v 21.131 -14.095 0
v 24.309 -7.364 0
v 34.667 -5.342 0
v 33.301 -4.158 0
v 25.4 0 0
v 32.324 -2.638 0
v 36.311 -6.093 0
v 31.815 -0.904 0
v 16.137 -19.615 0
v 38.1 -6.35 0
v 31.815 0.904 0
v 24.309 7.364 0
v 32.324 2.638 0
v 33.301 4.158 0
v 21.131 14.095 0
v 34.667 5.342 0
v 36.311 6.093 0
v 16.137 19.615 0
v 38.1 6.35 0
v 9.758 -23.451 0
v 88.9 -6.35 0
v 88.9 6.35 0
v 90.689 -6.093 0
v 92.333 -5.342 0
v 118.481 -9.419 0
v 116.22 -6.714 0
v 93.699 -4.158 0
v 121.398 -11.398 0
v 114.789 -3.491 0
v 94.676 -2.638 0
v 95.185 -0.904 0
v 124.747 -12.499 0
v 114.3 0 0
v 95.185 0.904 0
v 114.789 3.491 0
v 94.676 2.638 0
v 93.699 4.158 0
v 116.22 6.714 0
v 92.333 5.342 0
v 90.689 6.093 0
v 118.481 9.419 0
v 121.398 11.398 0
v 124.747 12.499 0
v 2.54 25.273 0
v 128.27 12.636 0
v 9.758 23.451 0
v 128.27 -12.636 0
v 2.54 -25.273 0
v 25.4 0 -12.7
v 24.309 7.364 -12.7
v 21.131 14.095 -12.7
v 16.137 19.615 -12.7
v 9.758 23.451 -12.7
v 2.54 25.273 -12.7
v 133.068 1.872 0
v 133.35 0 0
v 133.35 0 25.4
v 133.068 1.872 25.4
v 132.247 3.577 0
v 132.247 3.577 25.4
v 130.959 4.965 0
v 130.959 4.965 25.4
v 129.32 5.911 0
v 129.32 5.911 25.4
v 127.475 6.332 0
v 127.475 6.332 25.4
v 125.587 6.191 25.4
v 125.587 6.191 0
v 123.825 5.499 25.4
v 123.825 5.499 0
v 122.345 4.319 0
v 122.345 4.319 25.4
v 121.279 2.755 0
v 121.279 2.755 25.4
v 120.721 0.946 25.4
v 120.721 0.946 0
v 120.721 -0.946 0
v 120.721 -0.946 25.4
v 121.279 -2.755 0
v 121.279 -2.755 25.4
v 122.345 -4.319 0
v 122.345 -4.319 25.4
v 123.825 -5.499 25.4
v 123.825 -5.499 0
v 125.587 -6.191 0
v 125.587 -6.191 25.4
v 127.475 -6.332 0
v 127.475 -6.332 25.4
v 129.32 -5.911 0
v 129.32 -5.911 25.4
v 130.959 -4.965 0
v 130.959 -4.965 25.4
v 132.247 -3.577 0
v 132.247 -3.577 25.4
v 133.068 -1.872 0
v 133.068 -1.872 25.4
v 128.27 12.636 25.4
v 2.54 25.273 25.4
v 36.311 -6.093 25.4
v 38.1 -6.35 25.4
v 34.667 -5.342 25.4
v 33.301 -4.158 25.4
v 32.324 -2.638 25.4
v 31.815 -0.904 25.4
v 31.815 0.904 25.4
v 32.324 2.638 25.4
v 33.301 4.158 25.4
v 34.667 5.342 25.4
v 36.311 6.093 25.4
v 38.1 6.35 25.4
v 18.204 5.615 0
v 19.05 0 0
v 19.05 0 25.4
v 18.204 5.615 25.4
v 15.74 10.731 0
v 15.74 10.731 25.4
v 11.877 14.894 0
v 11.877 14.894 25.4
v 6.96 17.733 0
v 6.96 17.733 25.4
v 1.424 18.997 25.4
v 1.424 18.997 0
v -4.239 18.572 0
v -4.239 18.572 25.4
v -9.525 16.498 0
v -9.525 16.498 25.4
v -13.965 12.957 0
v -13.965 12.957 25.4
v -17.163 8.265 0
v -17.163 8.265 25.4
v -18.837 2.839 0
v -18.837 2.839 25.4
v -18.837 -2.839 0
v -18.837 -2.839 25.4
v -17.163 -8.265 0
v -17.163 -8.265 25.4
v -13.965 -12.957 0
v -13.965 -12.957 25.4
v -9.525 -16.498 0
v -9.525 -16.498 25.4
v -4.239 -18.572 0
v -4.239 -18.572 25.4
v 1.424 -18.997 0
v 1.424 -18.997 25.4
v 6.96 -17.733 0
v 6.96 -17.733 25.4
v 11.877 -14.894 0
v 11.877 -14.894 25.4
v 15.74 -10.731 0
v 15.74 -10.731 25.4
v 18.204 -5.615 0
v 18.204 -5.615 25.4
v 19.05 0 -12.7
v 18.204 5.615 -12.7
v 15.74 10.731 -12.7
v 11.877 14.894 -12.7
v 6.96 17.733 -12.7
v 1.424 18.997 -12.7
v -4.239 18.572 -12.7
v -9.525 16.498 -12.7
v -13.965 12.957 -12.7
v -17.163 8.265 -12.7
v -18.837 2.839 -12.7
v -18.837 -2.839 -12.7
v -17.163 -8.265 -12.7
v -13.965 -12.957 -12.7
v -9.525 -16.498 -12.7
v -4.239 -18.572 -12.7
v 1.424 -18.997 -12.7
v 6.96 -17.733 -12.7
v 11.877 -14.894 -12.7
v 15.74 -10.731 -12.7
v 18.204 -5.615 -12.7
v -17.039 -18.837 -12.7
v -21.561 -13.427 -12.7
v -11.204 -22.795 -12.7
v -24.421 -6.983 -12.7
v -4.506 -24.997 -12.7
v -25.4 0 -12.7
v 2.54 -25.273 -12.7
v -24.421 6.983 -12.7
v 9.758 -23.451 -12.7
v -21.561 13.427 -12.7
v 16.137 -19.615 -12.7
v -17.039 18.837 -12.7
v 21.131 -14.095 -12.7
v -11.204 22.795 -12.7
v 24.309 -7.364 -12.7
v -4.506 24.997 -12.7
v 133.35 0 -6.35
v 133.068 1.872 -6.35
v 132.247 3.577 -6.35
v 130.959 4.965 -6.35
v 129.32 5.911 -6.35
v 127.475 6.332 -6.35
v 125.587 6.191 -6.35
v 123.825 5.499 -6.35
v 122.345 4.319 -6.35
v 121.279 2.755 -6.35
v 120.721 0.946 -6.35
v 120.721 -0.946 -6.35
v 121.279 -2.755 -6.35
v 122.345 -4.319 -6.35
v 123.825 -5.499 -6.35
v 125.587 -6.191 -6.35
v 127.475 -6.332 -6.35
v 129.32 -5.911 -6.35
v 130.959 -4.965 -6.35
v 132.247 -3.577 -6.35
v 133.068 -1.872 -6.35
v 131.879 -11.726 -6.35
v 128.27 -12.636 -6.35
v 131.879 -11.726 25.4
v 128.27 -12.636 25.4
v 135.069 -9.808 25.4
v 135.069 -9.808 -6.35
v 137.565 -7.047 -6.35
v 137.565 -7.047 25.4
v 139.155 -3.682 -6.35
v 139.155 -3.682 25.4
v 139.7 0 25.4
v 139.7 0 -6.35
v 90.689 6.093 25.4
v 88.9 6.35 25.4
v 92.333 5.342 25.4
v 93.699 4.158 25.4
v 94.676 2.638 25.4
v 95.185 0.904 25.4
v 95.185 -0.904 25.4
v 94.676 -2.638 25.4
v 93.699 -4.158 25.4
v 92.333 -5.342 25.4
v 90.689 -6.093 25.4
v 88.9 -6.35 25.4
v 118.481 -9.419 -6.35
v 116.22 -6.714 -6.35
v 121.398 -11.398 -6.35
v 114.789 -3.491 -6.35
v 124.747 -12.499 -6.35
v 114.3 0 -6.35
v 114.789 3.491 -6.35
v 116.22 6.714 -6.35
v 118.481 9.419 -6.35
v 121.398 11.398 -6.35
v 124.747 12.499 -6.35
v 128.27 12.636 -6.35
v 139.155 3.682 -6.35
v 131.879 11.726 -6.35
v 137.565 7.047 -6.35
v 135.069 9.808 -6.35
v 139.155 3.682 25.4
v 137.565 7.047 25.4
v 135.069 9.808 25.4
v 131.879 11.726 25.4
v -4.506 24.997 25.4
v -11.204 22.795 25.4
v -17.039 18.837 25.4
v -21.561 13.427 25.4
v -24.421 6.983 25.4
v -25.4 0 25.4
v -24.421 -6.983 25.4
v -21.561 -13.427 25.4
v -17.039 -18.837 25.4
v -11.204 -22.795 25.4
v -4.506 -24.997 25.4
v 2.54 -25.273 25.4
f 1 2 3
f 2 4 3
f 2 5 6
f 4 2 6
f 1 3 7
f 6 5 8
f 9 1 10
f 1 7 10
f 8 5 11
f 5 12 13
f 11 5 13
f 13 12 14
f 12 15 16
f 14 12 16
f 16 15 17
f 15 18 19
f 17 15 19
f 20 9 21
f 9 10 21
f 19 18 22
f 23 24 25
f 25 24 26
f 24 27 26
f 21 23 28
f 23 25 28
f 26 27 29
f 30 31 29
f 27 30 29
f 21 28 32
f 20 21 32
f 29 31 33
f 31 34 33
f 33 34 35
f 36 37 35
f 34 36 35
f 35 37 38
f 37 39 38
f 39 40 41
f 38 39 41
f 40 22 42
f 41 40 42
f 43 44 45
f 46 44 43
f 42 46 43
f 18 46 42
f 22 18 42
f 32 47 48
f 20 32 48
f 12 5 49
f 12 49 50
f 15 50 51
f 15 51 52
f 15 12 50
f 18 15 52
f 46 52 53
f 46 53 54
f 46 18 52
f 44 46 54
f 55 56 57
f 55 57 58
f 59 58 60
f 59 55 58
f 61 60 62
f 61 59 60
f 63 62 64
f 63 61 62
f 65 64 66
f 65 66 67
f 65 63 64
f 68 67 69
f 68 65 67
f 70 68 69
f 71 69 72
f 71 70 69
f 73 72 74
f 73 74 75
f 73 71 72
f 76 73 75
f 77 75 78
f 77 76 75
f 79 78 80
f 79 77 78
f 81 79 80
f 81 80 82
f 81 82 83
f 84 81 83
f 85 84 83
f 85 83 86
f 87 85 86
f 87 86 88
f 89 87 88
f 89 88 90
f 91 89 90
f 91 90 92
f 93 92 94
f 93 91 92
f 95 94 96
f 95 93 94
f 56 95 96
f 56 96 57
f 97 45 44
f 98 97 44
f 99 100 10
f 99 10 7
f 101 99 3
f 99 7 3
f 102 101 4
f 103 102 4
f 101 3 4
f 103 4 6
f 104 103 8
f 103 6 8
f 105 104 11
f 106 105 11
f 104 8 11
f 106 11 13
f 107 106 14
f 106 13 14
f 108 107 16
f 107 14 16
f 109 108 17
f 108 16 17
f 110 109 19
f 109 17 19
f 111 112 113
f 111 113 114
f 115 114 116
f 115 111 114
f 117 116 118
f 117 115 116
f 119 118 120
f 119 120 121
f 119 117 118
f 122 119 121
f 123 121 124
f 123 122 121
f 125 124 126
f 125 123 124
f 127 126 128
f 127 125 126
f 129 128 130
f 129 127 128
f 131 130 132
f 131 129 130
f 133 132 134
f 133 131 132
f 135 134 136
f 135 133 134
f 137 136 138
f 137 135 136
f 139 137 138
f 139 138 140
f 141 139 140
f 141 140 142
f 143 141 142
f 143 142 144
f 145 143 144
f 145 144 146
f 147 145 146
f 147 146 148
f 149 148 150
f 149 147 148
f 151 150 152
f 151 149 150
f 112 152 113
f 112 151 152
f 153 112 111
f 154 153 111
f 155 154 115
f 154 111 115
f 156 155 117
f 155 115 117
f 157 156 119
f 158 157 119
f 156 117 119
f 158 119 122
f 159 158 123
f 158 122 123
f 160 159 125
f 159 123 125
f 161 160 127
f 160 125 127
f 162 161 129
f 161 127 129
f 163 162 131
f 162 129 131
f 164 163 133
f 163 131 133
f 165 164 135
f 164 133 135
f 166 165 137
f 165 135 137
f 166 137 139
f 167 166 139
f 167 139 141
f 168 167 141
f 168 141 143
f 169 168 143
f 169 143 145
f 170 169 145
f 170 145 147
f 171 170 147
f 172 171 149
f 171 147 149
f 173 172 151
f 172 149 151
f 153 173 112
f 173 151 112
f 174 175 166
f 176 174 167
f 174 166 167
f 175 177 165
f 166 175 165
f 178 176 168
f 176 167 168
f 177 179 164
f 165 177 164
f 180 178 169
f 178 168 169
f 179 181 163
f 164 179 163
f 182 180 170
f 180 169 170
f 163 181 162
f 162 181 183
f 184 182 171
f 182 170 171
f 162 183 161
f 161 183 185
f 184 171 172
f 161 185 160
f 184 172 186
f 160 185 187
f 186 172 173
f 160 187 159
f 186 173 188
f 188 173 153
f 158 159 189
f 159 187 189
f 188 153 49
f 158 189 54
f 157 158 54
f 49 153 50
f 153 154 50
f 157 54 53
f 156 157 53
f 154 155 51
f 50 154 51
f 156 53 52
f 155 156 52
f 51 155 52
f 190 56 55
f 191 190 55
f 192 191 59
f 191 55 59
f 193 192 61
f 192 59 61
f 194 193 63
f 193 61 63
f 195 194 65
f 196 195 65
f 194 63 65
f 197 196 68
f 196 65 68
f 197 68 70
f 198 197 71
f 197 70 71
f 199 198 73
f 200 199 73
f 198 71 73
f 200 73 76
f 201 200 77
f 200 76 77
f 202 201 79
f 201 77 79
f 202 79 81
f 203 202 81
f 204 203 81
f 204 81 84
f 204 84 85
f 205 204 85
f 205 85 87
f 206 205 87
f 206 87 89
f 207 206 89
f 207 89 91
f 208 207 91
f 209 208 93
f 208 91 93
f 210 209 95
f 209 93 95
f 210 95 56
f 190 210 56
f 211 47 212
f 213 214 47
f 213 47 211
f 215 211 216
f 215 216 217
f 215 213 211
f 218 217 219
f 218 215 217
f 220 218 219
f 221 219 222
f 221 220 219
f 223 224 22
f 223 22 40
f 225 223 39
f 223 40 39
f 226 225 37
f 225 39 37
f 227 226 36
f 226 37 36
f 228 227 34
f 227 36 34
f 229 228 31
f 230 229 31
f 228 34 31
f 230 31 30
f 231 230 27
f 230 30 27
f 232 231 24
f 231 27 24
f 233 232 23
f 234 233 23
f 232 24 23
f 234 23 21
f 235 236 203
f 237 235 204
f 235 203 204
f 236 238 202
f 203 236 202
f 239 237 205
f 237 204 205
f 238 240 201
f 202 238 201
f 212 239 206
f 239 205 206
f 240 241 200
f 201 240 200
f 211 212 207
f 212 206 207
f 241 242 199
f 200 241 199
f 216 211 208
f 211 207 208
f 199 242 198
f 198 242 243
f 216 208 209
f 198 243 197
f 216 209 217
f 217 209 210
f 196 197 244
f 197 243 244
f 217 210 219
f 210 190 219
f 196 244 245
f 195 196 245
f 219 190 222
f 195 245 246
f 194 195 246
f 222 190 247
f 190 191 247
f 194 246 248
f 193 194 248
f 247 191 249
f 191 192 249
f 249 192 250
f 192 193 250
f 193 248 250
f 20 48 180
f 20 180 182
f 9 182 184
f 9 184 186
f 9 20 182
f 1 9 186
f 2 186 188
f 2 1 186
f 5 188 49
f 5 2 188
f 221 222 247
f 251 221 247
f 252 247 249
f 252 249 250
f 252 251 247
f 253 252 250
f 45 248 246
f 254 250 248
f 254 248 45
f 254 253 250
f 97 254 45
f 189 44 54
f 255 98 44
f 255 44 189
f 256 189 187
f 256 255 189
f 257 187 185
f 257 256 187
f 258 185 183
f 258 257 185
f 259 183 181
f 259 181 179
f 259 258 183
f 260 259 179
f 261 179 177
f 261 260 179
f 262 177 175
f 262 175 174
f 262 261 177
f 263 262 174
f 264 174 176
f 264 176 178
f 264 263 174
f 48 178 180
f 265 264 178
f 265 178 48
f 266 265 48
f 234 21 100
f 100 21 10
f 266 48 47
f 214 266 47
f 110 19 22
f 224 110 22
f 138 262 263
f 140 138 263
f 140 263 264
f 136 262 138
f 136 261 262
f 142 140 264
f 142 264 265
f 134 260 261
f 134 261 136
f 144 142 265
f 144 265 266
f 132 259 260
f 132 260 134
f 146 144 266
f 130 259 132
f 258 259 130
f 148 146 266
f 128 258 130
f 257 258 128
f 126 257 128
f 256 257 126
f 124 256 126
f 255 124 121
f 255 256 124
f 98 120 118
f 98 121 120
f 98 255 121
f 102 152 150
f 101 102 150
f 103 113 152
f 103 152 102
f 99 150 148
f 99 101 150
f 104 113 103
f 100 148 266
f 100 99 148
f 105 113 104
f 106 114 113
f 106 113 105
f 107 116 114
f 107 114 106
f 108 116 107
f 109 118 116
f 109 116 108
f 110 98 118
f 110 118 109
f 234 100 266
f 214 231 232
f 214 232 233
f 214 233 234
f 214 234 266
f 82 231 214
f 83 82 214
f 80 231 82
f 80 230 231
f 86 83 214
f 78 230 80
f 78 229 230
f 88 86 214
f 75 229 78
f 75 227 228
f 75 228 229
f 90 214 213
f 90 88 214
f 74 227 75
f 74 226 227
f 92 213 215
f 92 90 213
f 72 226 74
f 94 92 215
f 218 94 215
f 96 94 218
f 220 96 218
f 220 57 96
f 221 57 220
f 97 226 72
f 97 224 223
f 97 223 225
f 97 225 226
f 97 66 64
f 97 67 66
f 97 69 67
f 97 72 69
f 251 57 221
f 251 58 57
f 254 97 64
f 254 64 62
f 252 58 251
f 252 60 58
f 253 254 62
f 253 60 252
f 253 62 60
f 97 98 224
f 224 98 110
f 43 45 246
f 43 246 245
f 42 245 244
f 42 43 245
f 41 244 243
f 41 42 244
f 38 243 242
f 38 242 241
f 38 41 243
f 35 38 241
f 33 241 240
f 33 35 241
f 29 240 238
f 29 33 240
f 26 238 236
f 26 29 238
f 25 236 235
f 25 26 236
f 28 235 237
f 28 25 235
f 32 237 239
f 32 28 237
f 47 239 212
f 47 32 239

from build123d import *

# Parameters (mm, degrees)
F0_R     = 19.05
F0_R_2   = 6.35
F1_DEPTH = 25.4
F2_DEPTH = 6.35
F3_DEPTH = 12.7


with BuildPart() as f1:
    # F0 (on Top) → F1 (new body)
    with BuildSketch(Plane.XY):
        with BuildLine():
            ThreePointArc((2.54, -25.272681), (18.837144, -17.038838), (25.4, 0))
            ThreePointArc((25.4, 0), (18.837144, 17.038838), (2.54, 25.272681))
            ThreePointArc((2.54, 25.272681), (-25.4, 0), (2.54, -25.272681))
        make_face()
        Circle(F0_R, mode=Mode.SUBTRACT)
        with BuildLine():
            ThreePointArc((2.54, 25.272681), (18.837144, 17.038838), (25.4, 0))
            ThreePointArc((25.4, 0), (18.837144, -17.038838), (2.54, -25.272681))
            Line((2.54, -25.272681), (128.27, -12.63634))
            ThreePointArc((128.27, -12.63634), (114.3, 0), (128.27, 12.63634))
            Line((128.27, 12.63634), (2.54, 25.272681))
        make_face()
        with BuildLine():
            ThreePointArc((38.1, -6.35), (31.75, 0), (38.1, 6.35))
            Line((38.1, 6.35), (88.9, 6.35))
            ThreePointArc((88.9, 6.35), (95.25, 0), (88.9, -6.35))
            Line((88.9, -6.35), (38.1, -6.35))
        make_face(mode=Mode.SUBTRACT)
        with BuildLine():
            ThreePointArc((139.7, 0), (136.418572, 8.519419), (128.27, 12.63634))
            ThreePointArc((128.27, 12.63634), (114.3, 0), (128.27, -12.63634))
            ThreePointArc((128.27, -12.63634), (136.418572, -8.519419), (139.7, 0))
        make_face()
        with Locations((127, 0)):
            Circle(F0_R_2, mode=Mode.SUBTRACT)
    extrude(amount=F1_DEPTH)

    # F0 (on Top) → F2 (join)
    with BuildSketch(Plane.XY):
        with BuildLine():
            ThreePointArc((139.7, 0), (136.418572, 8.519419), (128.27, 12.63634))
            ThreePointArc((128.27, 12.63634), (114.3, 0), (128.27, -12.63634))
            ThreePointArc((128.27, -12.63634), (136.418572, -8.519419), (139.7, 0))
        make_face()
        with Locations((127, 0)):
            Circle(F0_R_2, mode=Mode.SUBTRACT)
    extrude(amount=-F2_DEPTH)

    # F0 (on Top) → F3 (join)
    with BuildSketch(Plane.XY):
        with BuildLine():
            ThreePointArc((2.54, -25.272681), (18.837144, -17.038838), (25.4, 0))
            ThreePointArc((25.4, 0), (18.837144, 17.038838), (2.54, 25.272681))
            ThreePointArc((2.54, 25.272681), (-25.4, 0), (2.54, -25.272681))
        make_face()
        Circle(F0_R, mode=Mode.SUBTRACT)
    extrude(amount=-F3_DEPTH)


solid = f1.part
